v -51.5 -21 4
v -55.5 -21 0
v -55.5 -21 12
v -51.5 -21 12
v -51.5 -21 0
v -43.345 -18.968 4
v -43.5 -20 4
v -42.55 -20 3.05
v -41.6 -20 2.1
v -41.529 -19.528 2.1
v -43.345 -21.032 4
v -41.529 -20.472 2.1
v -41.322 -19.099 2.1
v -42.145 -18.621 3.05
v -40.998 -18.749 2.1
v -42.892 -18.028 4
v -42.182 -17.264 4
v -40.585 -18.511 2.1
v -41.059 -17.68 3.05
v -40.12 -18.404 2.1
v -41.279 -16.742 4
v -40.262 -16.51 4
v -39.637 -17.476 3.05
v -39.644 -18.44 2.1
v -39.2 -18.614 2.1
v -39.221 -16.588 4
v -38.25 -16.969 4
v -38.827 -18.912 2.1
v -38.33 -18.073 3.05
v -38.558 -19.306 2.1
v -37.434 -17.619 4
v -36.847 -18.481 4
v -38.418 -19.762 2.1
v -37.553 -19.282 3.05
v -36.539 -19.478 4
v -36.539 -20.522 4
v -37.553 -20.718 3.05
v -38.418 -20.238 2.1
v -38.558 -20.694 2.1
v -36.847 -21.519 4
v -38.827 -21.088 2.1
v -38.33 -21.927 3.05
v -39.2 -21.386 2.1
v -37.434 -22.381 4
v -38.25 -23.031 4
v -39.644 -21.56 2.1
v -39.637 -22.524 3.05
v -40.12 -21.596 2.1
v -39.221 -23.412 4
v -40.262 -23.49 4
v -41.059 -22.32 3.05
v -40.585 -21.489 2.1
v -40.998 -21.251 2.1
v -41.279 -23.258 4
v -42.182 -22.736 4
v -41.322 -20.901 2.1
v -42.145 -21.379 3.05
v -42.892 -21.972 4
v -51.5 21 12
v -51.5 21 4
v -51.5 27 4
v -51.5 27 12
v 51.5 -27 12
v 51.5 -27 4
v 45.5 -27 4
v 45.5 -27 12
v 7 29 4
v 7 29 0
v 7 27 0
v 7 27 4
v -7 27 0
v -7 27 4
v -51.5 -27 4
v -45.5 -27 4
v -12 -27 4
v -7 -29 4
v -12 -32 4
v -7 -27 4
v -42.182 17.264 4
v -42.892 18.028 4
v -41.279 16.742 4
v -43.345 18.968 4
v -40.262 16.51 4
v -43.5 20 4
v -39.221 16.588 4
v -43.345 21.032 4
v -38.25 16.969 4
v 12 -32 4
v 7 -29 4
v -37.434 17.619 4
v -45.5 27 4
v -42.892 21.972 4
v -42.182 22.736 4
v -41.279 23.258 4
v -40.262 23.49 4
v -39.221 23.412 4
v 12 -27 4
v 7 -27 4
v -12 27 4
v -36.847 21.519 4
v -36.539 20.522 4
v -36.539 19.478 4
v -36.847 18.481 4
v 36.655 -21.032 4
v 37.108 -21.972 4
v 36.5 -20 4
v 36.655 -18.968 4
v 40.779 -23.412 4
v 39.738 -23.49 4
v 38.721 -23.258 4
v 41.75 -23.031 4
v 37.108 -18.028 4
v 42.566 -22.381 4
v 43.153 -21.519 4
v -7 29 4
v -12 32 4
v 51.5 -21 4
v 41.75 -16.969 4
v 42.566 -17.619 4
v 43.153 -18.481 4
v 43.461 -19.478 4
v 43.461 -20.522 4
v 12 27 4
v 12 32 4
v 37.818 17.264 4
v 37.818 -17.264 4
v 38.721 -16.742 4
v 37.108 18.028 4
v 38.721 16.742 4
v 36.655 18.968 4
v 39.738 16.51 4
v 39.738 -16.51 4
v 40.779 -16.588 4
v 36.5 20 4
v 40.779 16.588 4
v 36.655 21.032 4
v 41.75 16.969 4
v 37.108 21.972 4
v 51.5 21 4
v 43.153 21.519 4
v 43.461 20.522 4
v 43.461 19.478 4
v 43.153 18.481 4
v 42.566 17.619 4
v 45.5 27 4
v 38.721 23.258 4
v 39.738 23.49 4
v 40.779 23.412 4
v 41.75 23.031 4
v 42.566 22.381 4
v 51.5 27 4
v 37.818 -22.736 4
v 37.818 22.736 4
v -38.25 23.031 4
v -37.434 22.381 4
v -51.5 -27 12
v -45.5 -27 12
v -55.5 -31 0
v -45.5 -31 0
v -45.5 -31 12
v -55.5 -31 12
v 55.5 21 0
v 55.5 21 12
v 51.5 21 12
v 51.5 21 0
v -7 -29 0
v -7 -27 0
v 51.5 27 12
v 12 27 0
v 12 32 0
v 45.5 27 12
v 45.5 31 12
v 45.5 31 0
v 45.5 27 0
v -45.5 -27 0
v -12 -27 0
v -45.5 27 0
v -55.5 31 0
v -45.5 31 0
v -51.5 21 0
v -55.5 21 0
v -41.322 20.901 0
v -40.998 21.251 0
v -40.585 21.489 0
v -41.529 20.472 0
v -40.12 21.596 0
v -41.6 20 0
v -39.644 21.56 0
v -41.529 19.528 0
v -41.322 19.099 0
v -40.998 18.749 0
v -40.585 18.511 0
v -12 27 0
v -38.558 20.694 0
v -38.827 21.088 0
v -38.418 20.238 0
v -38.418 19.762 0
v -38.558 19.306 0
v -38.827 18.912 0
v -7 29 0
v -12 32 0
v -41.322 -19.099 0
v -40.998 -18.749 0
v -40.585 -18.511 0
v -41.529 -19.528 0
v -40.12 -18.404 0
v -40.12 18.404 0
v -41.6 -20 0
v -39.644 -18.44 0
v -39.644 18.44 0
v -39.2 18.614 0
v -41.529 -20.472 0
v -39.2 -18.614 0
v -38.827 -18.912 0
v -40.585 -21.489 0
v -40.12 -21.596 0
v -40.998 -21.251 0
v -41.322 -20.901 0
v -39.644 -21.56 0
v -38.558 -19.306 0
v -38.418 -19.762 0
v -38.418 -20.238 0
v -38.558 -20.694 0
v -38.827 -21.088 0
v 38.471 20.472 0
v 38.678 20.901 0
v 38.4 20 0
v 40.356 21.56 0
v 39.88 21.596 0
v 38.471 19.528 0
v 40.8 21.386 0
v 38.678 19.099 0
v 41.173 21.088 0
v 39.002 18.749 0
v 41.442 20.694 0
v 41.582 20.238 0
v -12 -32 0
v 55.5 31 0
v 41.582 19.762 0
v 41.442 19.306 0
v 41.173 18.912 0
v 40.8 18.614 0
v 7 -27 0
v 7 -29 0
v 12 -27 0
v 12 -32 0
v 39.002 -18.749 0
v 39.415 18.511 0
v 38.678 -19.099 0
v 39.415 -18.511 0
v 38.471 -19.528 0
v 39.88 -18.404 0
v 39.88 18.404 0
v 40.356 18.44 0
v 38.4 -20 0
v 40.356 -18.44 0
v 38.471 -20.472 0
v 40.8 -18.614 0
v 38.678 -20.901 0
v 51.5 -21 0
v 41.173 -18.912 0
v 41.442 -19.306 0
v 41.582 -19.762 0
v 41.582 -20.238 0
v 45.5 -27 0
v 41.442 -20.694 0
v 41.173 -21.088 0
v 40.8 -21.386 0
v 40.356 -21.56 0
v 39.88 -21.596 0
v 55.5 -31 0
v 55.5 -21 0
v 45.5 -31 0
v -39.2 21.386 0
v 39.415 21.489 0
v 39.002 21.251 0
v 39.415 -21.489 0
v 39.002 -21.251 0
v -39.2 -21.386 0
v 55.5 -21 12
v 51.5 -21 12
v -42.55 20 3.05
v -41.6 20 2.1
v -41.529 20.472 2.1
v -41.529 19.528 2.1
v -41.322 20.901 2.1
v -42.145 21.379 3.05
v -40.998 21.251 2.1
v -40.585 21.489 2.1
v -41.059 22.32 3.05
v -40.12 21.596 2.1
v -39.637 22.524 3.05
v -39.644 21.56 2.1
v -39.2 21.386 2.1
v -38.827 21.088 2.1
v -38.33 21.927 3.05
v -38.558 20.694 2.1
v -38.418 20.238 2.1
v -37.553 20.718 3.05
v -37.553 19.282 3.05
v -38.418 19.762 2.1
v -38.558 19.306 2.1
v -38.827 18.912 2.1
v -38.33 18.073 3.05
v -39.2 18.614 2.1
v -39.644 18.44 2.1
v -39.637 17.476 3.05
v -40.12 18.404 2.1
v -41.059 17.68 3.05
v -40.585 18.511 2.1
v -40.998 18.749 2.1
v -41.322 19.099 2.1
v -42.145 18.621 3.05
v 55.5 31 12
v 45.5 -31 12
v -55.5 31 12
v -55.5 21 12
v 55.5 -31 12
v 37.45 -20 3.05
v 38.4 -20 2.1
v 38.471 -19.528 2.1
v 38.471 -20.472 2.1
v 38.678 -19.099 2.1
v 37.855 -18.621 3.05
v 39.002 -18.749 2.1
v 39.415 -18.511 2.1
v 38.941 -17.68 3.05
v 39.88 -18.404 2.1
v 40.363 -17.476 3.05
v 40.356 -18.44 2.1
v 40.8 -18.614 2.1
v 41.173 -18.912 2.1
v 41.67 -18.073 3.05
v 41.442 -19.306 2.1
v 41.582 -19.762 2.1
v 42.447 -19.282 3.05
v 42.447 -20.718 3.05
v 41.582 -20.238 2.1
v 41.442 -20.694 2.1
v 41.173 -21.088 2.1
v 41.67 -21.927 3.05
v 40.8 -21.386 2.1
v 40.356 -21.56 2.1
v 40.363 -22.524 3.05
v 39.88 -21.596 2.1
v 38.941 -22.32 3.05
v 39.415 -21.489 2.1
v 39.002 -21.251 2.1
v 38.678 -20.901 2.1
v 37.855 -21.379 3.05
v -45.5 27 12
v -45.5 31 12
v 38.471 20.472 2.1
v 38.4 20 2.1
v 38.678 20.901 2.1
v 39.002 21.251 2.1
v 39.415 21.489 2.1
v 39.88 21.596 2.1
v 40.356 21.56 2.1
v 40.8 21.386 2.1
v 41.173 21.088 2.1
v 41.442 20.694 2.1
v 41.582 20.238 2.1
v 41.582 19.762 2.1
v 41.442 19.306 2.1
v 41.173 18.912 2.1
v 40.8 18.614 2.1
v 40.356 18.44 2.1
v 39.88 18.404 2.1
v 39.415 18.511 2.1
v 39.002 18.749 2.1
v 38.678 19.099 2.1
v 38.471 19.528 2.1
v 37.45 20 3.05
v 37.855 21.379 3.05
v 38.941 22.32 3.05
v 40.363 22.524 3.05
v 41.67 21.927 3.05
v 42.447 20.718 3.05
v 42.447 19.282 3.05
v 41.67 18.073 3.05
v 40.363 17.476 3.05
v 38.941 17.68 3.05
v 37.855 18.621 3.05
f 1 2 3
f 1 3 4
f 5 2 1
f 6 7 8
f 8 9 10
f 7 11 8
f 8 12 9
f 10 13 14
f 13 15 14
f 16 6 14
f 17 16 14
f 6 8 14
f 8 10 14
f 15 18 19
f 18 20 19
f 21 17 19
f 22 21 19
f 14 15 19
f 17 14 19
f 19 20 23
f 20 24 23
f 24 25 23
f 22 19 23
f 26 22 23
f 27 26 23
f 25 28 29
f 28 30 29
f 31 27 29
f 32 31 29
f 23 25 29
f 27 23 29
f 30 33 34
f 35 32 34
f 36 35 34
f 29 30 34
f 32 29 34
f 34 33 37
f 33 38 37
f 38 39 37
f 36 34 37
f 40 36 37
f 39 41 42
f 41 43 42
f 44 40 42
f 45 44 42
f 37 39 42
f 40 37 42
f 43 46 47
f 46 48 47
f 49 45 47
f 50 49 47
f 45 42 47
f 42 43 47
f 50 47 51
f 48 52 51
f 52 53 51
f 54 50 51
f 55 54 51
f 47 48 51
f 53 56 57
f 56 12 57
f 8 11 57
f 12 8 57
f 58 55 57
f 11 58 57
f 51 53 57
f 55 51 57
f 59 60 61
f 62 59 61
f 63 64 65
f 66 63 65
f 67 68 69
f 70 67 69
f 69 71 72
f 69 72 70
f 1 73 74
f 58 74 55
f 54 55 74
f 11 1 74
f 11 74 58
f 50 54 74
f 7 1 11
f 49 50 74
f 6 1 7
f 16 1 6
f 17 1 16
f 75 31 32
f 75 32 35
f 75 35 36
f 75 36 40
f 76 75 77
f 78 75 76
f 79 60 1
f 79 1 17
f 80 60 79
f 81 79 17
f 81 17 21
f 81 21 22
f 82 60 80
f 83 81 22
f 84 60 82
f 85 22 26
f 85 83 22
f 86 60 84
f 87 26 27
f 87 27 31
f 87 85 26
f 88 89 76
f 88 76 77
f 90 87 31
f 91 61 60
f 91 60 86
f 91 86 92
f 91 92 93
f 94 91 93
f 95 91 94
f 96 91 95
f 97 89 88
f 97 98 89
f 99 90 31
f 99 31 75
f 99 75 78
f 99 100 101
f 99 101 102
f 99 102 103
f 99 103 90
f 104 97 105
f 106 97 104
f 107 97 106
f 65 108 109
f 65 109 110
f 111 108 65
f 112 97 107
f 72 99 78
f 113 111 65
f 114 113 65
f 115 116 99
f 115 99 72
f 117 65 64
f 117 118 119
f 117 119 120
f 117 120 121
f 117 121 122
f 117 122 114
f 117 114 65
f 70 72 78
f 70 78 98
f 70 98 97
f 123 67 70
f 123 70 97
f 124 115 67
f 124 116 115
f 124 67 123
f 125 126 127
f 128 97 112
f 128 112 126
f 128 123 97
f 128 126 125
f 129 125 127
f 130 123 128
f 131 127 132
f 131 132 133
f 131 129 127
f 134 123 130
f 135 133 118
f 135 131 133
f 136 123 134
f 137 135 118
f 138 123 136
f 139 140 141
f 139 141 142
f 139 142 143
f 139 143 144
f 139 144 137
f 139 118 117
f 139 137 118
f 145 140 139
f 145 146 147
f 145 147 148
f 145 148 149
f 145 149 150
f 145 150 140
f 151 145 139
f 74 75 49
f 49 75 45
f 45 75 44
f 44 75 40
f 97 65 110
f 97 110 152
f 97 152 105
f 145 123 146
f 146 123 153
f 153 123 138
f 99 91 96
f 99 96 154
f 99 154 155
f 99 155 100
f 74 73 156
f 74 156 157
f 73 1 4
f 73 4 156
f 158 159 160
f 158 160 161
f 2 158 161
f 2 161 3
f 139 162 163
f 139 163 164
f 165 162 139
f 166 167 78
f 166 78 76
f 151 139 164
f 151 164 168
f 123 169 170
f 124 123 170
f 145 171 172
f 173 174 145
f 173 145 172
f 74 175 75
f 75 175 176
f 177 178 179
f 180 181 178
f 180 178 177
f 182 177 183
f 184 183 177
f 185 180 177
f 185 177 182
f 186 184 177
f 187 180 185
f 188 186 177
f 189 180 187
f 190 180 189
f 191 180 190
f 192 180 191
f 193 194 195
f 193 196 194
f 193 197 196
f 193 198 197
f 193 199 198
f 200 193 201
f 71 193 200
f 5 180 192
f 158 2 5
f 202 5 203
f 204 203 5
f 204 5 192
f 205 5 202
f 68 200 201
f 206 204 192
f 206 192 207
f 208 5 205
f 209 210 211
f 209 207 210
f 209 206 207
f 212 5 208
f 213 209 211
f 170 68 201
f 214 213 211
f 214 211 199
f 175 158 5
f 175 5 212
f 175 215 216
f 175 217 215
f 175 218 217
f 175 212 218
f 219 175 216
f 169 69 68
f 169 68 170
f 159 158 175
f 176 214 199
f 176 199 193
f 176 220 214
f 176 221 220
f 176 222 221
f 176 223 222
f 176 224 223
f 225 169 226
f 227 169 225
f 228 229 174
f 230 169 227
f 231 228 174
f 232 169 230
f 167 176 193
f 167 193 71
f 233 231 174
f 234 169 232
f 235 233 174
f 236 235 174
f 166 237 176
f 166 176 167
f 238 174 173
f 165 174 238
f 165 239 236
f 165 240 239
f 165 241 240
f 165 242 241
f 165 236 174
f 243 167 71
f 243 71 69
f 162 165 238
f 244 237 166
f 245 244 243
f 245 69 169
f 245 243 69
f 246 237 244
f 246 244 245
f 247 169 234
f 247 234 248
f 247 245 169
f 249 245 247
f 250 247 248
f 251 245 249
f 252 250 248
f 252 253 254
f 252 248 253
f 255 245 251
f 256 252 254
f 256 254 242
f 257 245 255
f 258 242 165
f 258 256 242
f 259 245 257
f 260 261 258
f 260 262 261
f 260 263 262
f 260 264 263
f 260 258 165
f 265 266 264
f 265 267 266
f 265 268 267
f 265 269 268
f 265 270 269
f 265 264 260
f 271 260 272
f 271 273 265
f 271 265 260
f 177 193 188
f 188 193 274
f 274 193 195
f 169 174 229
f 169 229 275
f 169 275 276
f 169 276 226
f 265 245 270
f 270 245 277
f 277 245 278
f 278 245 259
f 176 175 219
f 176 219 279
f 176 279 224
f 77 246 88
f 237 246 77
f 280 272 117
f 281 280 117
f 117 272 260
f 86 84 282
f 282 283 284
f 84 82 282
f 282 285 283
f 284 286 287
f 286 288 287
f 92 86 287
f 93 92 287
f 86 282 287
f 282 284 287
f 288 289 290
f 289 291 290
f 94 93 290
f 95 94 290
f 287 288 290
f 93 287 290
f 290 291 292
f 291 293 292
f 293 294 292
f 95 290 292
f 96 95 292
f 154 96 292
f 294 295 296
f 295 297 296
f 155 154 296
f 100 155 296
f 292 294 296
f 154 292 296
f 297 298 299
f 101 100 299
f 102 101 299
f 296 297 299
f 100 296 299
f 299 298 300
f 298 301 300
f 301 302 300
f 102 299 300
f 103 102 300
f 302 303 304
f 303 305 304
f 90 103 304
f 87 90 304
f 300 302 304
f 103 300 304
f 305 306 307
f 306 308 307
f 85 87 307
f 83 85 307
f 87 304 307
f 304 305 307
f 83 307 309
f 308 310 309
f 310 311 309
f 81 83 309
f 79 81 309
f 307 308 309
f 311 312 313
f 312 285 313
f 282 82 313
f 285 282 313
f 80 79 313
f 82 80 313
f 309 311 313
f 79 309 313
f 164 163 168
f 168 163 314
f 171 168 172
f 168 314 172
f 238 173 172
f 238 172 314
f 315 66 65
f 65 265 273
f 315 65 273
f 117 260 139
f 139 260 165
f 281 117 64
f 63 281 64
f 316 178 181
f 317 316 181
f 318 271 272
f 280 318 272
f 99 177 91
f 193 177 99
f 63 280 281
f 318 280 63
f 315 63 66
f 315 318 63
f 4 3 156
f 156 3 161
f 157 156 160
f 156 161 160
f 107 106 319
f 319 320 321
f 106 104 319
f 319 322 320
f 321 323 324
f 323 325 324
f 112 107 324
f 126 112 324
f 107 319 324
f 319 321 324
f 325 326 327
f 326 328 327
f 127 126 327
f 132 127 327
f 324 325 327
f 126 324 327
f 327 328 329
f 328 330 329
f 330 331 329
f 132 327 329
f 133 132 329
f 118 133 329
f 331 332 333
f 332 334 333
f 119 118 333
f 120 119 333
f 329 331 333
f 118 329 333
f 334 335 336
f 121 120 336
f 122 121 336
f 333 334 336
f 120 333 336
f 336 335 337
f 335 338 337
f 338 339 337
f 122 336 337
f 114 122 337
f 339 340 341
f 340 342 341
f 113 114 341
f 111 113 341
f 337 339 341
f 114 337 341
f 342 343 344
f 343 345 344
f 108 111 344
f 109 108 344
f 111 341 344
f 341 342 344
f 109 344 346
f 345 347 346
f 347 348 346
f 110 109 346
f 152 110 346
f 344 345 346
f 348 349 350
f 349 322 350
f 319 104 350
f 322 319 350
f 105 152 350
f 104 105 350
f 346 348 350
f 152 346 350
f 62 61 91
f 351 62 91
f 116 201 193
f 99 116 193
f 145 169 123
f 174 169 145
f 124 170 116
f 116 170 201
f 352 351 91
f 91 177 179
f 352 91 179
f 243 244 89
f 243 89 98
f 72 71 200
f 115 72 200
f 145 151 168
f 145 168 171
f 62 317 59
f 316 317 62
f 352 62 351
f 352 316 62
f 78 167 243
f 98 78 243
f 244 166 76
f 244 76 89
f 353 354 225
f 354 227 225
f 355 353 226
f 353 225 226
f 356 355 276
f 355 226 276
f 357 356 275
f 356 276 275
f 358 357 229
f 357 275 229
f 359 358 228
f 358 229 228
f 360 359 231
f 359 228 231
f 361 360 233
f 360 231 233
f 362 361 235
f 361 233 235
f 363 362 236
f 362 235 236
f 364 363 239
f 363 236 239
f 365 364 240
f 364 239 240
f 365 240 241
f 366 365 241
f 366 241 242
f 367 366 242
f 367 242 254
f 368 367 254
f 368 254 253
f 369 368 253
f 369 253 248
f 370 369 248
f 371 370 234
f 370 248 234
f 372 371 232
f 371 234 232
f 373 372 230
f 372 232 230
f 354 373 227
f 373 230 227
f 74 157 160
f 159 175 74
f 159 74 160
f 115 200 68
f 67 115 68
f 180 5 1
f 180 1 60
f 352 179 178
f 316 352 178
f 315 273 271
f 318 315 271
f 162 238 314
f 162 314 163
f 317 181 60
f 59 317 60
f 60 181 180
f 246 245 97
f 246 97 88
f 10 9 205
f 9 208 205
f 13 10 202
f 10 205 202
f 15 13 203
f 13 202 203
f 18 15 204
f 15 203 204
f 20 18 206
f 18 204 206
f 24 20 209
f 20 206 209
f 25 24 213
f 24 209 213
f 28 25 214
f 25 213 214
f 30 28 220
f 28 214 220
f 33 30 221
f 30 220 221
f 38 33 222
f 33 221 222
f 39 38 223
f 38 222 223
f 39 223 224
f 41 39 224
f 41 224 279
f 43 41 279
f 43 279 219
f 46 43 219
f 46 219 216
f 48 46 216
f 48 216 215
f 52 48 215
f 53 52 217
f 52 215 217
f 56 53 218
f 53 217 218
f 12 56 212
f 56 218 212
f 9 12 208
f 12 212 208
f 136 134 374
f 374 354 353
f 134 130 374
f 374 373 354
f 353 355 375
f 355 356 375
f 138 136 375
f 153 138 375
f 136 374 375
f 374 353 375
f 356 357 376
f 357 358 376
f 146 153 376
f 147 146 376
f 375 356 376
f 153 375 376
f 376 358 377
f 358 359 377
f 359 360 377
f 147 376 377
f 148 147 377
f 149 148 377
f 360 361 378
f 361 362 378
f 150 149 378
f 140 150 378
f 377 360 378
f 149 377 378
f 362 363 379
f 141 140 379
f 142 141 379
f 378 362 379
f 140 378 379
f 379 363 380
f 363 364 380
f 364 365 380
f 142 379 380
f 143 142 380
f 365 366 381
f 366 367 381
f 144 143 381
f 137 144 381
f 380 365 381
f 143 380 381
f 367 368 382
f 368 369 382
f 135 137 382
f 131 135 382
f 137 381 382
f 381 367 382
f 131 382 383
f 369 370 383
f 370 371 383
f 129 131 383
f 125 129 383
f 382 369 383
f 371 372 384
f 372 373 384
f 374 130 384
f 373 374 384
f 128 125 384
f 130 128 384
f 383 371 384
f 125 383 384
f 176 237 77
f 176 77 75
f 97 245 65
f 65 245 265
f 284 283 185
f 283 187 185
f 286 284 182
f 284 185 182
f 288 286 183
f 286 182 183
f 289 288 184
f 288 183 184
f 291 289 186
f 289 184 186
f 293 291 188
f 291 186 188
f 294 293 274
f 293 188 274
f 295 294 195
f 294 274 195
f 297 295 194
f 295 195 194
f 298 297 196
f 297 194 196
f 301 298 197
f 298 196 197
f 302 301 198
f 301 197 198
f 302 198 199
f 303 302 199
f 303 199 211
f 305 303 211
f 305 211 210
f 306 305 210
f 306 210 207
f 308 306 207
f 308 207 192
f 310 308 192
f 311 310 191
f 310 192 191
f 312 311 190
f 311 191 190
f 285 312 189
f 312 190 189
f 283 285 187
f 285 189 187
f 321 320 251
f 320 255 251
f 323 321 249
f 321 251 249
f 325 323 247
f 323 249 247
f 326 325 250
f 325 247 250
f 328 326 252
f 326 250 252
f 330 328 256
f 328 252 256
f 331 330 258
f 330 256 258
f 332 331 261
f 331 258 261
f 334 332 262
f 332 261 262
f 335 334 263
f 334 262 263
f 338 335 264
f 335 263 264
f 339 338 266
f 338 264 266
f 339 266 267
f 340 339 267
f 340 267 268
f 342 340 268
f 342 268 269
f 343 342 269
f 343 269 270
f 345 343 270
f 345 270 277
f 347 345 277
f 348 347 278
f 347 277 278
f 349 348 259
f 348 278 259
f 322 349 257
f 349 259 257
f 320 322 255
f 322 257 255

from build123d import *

# Parameters (mm, degrees)
SKETCH_W                = 103
SKETCH_H                = 54
PAD_DEPTH               = 4
PAD001_DEPTH            = 12
PAD001_MIRRORED_2_DEPTH = 12
POLARPATTERN_COUNT      = 2
HOLE_D                  = 3.2
HOLE_CSINK_D            = 7
HOLE_CSINK_ANGLE        = 90
PAD002_DEPTH            = 4


with BuildPart() as part:
    # Sketch → Pad (new body)
    with BuildSketch(Plane.XY):
        Rectangle(SKETCH_W, SKETCH_H)
    extrude(amount=PAD_DEPTH)

    # Sketch001 → Pad001 (join)
    with BuildSketch(Plane.XY):
        Polygon((-51.5, 21), (-51.5, 27), (-45.5, 27), (-45.5, 31), (-55.5, 31), (-55.5, 21), align=None)
    pad001 = extrude(amount=PAD001_DEPTH)

    # Sketch001 Mirrored 2 → Pad001 Mirrored 2 (add)
    with BuildSketch(Plane(origin=(0, 0, 0), x_dir=(-1, 0, 0), z_dir=(0, 0, -1))):
        Polygon((-51.5, 21), (-51.5, 27), (-45.5, 27), (-45.5, 31), (-55.5, 31), (-55.5, 21), align=None)
    pad001_mirrored_2 = extrude(amount=-PAD001_MIRRORED_2_DEPTH)

    # PolarPattern: Pad001, Pad001 Mirrored 2 ×2 about axis
    polarpattern_axis = Axis((0, 0, 0), (0, 0, 1))
    for i in range(1, POLARPATTERN_COUNT):
        add(pad001.rotate(polarpattern_axis, i * 360 / POLARPATTERN_COUNT))
        add(pad001_mirrored_2.rotate(polarpattern_axis, i * 360 / POLARPATTERN_COUNT))

    # Hole (through all)
    with Locations(Plane.XY.offset(4)):
        with Locations((-40, 20), (40, 20), (40, -20), (-40, -20)):
            CounterSinkHole(HOLE_D / 2, HOLE_CSINK_D / 2, counter_sink_angle=HOLE_CSINK_ANGLE)

    # Sketch004 → Pad002 (join)
    with BuildSketch(Plane.XY):
        Polygon((-7, 27), (-7, 29), (7, 29), (7, 27), (12, 27), (12, 32), (-12, 32), (-12, 27), align=None)
    pad002 = extrude(amount=PAD002_DEPTH)

    # Mirrored001: Pad002 across XZ
    add(pad002.mirror(Plane.XZ))


solid = part.part
